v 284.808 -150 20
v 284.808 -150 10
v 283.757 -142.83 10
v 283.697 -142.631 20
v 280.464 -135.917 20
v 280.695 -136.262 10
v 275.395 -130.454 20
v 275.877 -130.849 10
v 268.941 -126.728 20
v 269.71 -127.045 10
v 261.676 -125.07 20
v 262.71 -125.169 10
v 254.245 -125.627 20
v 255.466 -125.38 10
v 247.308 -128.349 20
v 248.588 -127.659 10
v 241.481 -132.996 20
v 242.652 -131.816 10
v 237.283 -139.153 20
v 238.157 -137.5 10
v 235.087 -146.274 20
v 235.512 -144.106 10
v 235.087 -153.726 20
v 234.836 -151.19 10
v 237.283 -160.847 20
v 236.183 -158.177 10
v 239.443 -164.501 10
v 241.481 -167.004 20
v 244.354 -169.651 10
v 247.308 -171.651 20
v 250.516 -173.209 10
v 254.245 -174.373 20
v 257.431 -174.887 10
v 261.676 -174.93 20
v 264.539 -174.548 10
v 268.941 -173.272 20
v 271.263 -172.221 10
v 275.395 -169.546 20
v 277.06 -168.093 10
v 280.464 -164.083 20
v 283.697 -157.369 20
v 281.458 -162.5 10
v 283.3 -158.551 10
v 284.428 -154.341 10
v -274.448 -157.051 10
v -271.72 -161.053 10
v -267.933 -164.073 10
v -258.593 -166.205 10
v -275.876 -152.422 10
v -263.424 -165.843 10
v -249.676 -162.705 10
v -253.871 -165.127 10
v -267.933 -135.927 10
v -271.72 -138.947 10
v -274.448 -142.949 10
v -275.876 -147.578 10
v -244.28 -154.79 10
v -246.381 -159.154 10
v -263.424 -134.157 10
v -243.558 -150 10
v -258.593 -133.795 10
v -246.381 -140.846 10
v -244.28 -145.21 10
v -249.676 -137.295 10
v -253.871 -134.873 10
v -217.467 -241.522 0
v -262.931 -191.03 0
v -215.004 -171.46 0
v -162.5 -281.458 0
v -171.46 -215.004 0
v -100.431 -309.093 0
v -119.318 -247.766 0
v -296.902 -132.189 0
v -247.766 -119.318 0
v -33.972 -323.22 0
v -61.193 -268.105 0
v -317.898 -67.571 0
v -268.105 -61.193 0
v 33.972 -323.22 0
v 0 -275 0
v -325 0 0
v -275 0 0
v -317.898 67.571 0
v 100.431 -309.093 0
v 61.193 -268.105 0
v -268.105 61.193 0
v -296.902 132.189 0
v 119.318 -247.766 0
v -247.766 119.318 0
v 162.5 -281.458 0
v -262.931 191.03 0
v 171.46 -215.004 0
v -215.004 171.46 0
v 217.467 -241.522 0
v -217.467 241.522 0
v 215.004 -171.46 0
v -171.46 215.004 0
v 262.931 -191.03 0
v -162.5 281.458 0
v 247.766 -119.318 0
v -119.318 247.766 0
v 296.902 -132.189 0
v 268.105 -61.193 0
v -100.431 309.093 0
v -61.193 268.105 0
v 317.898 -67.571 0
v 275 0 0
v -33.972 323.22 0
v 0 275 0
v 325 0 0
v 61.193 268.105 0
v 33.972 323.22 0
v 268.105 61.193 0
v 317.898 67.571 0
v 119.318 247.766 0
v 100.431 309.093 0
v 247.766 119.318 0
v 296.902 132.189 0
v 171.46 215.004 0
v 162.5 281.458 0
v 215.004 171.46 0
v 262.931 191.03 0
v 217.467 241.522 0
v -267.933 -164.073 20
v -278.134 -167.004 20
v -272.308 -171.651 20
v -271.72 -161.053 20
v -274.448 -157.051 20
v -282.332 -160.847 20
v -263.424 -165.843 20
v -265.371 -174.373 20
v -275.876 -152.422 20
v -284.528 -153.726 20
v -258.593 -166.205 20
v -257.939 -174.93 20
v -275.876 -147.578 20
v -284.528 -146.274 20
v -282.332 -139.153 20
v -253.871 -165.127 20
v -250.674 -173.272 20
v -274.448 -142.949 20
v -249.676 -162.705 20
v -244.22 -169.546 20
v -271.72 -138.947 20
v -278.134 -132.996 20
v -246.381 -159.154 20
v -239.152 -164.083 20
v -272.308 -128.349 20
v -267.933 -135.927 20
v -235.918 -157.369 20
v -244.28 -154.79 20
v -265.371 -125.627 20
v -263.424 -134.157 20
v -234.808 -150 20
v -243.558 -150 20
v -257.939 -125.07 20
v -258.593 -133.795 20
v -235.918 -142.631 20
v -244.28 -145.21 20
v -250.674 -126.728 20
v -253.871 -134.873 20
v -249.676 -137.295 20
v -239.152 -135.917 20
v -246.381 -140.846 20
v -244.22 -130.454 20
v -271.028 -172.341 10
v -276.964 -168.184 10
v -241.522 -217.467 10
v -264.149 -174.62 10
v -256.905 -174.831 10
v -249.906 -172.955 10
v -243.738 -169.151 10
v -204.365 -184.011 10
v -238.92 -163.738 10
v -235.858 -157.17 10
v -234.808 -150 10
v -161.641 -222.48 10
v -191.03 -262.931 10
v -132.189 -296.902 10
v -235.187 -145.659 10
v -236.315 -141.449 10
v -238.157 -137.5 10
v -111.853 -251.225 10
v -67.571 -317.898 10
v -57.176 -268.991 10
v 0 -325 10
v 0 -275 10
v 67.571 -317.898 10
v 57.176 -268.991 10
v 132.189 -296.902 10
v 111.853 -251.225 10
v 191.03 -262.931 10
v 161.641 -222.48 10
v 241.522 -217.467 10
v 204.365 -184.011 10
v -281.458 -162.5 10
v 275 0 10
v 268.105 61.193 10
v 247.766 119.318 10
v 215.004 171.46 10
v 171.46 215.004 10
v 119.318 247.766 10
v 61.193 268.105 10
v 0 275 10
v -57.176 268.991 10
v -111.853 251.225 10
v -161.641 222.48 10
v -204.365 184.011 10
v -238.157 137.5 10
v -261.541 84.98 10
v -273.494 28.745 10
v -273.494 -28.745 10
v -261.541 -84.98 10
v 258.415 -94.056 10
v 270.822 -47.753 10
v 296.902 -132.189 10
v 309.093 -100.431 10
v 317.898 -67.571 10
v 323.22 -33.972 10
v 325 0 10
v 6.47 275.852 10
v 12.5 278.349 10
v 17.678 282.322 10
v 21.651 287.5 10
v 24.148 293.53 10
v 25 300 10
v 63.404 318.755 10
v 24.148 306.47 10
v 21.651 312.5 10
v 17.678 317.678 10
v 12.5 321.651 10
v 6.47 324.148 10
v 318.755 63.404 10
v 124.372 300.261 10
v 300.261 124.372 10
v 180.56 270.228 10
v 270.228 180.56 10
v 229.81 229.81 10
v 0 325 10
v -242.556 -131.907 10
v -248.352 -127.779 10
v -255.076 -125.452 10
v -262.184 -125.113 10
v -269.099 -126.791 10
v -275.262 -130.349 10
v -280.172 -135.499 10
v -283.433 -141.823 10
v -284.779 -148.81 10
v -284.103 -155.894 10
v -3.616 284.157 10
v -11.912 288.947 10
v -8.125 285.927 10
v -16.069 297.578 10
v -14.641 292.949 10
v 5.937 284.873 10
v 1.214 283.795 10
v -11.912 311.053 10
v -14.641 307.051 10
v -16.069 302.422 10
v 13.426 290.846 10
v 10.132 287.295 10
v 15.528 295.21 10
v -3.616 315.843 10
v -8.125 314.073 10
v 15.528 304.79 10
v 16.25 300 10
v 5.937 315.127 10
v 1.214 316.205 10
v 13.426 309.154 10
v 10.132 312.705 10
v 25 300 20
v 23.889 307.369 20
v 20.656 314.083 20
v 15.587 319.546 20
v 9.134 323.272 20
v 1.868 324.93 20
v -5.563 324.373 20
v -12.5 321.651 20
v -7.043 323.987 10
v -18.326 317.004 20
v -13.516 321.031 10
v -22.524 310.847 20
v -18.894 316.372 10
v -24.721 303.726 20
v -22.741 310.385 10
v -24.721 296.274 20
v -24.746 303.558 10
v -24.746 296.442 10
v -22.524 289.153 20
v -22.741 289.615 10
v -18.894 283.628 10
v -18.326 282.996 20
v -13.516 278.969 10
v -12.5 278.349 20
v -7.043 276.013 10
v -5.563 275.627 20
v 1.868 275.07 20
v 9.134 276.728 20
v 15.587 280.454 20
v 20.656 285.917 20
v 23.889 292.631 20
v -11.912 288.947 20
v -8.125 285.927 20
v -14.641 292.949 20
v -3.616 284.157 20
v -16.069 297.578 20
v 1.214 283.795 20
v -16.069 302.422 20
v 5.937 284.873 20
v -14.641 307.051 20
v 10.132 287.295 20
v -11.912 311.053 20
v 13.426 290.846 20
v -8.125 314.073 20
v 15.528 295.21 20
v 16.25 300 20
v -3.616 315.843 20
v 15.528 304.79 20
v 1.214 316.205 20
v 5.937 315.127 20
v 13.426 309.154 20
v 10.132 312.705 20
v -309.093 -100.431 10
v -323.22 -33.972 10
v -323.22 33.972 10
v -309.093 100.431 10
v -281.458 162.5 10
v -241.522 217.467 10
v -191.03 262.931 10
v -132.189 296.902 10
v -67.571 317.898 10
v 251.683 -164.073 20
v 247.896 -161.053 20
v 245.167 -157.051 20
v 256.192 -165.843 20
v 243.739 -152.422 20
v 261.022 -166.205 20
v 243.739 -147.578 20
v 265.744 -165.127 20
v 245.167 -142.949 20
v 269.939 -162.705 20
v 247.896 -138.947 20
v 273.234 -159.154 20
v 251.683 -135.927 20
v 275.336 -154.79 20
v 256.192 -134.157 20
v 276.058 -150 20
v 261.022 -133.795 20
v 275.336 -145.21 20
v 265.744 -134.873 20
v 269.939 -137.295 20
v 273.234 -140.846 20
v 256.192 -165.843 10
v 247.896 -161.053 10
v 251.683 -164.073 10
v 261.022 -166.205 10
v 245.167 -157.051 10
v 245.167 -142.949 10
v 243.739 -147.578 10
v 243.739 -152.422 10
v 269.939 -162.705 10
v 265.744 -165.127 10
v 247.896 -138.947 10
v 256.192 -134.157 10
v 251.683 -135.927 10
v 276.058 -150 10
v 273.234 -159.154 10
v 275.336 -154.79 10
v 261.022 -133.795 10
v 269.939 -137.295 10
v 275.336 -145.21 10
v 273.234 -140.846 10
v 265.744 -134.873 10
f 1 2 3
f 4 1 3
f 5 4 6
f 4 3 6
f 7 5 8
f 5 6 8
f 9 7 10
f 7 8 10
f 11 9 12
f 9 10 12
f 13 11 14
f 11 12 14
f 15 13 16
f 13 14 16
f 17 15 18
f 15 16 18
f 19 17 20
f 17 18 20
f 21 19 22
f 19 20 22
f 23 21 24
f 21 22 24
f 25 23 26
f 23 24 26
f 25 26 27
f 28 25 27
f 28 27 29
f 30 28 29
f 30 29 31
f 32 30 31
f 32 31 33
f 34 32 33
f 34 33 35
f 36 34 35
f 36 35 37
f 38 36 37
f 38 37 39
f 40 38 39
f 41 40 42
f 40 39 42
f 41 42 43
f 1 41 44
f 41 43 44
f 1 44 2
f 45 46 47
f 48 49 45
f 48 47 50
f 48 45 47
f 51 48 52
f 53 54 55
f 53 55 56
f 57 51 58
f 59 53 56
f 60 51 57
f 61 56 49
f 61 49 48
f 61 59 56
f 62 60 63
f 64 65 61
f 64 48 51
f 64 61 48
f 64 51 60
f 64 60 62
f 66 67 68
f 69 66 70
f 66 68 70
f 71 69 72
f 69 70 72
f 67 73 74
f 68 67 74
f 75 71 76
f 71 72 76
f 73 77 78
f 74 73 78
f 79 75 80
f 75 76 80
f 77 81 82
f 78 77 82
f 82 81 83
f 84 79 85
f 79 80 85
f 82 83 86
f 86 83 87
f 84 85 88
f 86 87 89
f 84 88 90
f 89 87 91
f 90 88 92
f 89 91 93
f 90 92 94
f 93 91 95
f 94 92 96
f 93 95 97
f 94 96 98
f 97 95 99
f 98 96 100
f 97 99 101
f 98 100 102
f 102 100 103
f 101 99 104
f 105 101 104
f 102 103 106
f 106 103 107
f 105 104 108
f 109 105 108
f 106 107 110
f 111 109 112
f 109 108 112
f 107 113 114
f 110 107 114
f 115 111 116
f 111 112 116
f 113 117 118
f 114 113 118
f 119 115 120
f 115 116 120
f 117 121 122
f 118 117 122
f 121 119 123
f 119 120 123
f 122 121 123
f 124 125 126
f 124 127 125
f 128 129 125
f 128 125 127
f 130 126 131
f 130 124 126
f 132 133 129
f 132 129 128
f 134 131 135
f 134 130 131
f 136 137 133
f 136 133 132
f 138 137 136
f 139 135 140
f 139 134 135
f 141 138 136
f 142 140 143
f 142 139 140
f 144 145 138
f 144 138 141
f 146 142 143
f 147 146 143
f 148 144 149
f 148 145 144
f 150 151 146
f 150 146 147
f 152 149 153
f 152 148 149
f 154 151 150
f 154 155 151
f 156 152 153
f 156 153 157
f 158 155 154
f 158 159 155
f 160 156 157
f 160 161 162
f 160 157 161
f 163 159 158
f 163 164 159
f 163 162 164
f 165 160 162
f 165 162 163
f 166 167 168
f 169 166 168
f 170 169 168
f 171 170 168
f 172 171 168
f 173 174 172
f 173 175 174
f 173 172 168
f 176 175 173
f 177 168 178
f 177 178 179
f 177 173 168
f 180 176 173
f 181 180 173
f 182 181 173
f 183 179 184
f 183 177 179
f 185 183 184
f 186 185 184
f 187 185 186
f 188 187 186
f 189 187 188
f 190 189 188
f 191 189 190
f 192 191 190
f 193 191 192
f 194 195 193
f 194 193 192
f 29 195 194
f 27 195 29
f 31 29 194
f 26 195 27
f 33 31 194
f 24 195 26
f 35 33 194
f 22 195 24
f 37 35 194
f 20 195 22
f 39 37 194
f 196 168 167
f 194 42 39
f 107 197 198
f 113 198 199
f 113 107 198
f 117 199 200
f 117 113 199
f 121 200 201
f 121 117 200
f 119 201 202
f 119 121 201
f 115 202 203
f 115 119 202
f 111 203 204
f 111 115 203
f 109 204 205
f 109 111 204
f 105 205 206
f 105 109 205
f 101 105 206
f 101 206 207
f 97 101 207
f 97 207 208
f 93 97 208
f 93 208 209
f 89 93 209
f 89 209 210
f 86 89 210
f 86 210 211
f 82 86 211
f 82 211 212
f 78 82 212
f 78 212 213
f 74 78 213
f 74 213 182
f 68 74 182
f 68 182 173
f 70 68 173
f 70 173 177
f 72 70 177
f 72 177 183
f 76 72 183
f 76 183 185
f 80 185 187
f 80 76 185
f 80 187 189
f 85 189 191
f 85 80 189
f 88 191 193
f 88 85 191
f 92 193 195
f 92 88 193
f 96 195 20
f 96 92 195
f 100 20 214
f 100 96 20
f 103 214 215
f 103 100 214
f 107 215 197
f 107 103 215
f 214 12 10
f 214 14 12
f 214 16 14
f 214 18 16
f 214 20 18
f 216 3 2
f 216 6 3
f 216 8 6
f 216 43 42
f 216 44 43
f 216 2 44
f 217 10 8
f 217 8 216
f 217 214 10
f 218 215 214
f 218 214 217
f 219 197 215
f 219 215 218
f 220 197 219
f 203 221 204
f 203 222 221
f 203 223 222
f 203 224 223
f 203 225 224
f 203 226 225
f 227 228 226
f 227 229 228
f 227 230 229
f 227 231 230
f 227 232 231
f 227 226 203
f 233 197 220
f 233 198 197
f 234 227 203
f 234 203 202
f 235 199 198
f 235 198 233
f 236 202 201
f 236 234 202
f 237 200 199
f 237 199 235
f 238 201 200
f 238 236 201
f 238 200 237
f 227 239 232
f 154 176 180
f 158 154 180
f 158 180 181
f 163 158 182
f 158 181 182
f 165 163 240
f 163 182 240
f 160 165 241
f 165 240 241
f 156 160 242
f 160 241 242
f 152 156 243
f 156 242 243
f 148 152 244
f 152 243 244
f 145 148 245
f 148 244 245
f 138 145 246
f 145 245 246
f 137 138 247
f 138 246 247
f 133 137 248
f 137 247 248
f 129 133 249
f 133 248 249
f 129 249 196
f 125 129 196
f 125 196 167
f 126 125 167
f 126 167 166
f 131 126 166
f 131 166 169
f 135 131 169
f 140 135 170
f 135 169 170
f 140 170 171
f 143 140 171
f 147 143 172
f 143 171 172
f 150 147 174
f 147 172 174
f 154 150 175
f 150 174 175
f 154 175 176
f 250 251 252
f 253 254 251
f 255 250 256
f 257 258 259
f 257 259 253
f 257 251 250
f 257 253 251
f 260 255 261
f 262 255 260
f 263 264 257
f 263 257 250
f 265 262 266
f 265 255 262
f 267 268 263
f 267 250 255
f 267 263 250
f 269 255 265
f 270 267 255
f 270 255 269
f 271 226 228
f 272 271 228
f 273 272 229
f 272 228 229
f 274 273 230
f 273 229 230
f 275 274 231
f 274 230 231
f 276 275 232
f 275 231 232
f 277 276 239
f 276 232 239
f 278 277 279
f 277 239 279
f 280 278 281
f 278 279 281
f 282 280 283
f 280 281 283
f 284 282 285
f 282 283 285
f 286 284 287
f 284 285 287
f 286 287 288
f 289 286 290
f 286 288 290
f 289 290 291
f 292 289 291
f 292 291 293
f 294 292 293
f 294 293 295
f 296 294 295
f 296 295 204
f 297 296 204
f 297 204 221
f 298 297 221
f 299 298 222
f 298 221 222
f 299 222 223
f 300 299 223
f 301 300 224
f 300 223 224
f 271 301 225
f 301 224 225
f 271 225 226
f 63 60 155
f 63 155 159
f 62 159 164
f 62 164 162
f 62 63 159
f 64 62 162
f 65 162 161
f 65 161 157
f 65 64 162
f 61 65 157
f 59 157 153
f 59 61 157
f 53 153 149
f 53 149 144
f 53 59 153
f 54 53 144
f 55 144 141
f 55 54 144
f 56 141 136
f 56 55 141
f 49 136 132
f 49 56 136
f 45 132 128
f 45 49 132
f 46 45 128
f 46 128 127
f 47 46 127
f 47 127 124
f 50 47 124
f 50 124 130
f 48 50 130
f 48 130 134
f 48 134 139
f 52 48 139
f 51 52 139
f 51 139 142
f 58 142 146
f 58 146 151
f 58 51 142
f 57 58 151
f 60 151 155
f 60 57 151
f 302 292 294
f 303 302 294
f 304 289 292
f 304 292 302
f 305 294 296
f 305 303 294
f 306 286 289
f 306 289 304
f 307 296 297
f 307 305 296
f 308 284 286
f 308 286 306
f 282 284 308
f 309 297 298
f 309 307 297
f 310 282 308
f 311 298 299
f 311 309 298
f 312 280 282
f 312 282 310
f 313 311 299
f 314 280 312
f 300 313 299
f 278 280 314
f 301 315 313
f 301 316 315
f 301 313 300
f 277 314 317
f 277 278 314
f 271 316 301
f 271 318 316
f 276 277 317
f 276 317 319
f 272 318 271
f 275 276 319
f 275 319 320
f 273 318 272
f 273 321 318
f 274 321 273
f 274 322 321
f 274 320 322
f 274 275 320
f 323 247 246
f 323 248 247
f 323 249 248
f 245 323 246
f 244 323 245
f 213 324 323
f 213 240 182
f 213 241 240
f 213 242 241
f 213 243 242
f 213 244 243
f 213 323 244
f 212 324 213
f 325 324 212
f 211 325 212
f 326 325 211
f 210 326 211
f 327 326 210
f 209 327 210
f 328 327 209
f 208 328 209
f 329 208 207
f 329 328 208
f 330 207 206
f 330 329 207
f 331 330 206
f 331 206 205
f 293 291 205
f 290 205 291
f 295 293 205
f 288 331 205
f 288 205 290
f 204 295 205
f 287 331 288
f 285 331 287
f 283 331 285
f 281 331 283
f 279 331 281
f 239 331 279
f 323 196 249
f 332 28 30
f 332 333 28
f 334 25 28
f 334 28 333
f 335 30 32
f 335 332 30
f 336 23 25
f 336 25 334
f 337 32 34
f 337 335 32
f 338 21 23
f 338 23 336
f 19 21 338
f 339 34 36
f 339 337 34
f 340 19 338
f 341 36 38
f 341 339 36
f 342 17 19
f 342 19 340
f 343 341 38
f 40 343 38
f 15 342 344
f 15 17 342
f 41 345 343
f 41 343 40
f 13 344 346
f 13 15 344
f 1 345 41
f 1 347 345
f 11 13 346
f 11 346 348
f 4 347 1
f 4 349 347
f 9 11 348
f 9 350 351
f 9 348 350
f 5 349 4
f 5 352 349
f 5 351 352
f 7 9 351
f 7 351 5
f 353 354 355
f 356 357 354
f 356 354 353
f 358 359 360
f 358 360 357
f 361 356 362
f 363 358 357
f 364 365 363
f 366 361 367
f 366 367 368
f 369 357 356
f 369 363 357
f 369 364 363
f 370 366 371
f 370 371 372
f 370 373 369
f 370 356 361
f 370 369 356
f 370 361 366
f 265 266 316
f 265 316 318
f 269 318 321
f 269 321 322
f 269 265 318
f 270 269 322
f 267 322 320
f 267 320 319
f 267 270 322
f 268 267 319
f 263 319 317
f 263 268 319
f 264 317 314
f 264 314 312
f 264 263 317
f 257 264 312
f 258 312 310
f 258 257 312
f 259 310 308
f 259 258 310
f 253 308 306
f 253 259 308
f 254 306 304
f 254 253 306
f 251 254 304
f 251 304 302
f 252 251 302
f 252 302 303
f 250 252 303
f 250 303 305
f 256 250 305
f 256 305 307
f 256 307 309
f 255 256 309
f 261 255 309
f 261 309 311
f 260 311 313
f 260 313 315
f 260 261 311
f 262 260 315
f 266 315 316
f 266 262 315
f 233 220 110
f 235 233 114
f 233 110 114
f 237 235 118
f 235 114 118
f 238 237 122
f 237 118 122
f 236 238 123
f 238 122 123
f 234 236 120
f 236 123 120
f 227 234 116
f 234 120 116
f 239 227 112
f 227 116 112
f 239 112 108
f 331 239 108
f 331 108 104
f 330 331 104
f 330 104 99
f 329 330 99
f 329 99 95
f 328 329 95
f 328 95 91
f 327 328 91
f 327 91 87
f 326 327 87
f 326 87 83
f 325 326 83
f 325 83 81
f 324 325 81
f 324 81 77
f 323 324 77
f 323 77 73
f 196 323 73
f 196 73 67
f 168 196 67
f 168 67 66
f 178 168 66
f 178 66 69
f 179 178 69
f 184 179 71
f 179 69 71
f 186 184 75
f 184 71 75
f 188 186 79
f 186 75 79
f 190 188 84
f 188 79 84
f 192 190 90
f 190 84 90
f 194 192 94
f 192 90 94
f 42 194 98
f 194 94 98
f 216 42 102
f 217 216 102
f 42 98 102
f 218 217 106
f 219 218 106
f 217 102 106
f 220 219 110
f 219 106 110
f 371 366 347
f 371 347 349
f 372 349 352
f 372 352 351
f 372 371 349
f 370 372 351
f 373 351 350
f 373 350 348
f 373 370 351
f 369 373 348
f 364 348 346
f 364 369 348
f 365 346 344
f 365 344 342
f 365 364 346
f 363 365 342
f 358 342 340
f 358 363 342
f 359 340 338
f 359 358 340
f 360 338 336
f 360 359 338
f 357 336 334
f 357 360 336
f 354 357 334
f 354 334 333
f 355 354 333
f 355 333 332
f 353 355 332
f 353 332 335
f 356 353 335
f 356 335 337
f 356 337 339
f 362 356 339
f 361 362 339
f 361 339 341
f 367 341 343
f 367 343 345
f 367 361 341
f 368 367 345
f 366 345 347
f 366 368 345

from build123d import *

# Parameters (mm, degrees)
SKETCH1_R           = 325
SKETCH1_R_2         = 275
BOSS_EXTRUDE1_DEPTH = 10
SKETCH2_R           = 25
SKETCH2_R_2         = 16.25
BOSS_EXTRUDE2_DEPTH = 10


with BuildPart() as part:
    # Sketch1 → Boss-Extrude1 (new body)
    with BuildSketch(Plane.XY):
        Circle(SKETCH1_R)
        Circle(SKETCH1_R_2, mode=Mode.SUBTRACT)
    extrude(amount=BOSS_EXTRUDE1_DEPTH)

    # Sketch2 → Boss-Extrude2 (add)
    with BuildSketch(Plane.XY.offset(10)):
        with Locations((0, 300)):
            Circle(SKETCH2_R)
        with Locations((0, 300)):
            Circle(SKETCH2_R_2, mode=Mode.SUBTRACT)
        with Locations((259.807621135, -150)):
            Circle(SKETCH2_R)
        with Locations((259.807621135, -150)):
            Circle(SKETCH2_R_2, mode=Mode.SUBTRACT)
        with Locations((-259.807621135, -150)):
            Circle(SKETCH2_R)
        with Locations((-259.807621135, -150)):
            Circle(SKETCH2_R_2, mode=Mode.SUBTRACT)
    extrude(amount=BOSS_EXTRUDE2_DEPTH)


solid = part.part
